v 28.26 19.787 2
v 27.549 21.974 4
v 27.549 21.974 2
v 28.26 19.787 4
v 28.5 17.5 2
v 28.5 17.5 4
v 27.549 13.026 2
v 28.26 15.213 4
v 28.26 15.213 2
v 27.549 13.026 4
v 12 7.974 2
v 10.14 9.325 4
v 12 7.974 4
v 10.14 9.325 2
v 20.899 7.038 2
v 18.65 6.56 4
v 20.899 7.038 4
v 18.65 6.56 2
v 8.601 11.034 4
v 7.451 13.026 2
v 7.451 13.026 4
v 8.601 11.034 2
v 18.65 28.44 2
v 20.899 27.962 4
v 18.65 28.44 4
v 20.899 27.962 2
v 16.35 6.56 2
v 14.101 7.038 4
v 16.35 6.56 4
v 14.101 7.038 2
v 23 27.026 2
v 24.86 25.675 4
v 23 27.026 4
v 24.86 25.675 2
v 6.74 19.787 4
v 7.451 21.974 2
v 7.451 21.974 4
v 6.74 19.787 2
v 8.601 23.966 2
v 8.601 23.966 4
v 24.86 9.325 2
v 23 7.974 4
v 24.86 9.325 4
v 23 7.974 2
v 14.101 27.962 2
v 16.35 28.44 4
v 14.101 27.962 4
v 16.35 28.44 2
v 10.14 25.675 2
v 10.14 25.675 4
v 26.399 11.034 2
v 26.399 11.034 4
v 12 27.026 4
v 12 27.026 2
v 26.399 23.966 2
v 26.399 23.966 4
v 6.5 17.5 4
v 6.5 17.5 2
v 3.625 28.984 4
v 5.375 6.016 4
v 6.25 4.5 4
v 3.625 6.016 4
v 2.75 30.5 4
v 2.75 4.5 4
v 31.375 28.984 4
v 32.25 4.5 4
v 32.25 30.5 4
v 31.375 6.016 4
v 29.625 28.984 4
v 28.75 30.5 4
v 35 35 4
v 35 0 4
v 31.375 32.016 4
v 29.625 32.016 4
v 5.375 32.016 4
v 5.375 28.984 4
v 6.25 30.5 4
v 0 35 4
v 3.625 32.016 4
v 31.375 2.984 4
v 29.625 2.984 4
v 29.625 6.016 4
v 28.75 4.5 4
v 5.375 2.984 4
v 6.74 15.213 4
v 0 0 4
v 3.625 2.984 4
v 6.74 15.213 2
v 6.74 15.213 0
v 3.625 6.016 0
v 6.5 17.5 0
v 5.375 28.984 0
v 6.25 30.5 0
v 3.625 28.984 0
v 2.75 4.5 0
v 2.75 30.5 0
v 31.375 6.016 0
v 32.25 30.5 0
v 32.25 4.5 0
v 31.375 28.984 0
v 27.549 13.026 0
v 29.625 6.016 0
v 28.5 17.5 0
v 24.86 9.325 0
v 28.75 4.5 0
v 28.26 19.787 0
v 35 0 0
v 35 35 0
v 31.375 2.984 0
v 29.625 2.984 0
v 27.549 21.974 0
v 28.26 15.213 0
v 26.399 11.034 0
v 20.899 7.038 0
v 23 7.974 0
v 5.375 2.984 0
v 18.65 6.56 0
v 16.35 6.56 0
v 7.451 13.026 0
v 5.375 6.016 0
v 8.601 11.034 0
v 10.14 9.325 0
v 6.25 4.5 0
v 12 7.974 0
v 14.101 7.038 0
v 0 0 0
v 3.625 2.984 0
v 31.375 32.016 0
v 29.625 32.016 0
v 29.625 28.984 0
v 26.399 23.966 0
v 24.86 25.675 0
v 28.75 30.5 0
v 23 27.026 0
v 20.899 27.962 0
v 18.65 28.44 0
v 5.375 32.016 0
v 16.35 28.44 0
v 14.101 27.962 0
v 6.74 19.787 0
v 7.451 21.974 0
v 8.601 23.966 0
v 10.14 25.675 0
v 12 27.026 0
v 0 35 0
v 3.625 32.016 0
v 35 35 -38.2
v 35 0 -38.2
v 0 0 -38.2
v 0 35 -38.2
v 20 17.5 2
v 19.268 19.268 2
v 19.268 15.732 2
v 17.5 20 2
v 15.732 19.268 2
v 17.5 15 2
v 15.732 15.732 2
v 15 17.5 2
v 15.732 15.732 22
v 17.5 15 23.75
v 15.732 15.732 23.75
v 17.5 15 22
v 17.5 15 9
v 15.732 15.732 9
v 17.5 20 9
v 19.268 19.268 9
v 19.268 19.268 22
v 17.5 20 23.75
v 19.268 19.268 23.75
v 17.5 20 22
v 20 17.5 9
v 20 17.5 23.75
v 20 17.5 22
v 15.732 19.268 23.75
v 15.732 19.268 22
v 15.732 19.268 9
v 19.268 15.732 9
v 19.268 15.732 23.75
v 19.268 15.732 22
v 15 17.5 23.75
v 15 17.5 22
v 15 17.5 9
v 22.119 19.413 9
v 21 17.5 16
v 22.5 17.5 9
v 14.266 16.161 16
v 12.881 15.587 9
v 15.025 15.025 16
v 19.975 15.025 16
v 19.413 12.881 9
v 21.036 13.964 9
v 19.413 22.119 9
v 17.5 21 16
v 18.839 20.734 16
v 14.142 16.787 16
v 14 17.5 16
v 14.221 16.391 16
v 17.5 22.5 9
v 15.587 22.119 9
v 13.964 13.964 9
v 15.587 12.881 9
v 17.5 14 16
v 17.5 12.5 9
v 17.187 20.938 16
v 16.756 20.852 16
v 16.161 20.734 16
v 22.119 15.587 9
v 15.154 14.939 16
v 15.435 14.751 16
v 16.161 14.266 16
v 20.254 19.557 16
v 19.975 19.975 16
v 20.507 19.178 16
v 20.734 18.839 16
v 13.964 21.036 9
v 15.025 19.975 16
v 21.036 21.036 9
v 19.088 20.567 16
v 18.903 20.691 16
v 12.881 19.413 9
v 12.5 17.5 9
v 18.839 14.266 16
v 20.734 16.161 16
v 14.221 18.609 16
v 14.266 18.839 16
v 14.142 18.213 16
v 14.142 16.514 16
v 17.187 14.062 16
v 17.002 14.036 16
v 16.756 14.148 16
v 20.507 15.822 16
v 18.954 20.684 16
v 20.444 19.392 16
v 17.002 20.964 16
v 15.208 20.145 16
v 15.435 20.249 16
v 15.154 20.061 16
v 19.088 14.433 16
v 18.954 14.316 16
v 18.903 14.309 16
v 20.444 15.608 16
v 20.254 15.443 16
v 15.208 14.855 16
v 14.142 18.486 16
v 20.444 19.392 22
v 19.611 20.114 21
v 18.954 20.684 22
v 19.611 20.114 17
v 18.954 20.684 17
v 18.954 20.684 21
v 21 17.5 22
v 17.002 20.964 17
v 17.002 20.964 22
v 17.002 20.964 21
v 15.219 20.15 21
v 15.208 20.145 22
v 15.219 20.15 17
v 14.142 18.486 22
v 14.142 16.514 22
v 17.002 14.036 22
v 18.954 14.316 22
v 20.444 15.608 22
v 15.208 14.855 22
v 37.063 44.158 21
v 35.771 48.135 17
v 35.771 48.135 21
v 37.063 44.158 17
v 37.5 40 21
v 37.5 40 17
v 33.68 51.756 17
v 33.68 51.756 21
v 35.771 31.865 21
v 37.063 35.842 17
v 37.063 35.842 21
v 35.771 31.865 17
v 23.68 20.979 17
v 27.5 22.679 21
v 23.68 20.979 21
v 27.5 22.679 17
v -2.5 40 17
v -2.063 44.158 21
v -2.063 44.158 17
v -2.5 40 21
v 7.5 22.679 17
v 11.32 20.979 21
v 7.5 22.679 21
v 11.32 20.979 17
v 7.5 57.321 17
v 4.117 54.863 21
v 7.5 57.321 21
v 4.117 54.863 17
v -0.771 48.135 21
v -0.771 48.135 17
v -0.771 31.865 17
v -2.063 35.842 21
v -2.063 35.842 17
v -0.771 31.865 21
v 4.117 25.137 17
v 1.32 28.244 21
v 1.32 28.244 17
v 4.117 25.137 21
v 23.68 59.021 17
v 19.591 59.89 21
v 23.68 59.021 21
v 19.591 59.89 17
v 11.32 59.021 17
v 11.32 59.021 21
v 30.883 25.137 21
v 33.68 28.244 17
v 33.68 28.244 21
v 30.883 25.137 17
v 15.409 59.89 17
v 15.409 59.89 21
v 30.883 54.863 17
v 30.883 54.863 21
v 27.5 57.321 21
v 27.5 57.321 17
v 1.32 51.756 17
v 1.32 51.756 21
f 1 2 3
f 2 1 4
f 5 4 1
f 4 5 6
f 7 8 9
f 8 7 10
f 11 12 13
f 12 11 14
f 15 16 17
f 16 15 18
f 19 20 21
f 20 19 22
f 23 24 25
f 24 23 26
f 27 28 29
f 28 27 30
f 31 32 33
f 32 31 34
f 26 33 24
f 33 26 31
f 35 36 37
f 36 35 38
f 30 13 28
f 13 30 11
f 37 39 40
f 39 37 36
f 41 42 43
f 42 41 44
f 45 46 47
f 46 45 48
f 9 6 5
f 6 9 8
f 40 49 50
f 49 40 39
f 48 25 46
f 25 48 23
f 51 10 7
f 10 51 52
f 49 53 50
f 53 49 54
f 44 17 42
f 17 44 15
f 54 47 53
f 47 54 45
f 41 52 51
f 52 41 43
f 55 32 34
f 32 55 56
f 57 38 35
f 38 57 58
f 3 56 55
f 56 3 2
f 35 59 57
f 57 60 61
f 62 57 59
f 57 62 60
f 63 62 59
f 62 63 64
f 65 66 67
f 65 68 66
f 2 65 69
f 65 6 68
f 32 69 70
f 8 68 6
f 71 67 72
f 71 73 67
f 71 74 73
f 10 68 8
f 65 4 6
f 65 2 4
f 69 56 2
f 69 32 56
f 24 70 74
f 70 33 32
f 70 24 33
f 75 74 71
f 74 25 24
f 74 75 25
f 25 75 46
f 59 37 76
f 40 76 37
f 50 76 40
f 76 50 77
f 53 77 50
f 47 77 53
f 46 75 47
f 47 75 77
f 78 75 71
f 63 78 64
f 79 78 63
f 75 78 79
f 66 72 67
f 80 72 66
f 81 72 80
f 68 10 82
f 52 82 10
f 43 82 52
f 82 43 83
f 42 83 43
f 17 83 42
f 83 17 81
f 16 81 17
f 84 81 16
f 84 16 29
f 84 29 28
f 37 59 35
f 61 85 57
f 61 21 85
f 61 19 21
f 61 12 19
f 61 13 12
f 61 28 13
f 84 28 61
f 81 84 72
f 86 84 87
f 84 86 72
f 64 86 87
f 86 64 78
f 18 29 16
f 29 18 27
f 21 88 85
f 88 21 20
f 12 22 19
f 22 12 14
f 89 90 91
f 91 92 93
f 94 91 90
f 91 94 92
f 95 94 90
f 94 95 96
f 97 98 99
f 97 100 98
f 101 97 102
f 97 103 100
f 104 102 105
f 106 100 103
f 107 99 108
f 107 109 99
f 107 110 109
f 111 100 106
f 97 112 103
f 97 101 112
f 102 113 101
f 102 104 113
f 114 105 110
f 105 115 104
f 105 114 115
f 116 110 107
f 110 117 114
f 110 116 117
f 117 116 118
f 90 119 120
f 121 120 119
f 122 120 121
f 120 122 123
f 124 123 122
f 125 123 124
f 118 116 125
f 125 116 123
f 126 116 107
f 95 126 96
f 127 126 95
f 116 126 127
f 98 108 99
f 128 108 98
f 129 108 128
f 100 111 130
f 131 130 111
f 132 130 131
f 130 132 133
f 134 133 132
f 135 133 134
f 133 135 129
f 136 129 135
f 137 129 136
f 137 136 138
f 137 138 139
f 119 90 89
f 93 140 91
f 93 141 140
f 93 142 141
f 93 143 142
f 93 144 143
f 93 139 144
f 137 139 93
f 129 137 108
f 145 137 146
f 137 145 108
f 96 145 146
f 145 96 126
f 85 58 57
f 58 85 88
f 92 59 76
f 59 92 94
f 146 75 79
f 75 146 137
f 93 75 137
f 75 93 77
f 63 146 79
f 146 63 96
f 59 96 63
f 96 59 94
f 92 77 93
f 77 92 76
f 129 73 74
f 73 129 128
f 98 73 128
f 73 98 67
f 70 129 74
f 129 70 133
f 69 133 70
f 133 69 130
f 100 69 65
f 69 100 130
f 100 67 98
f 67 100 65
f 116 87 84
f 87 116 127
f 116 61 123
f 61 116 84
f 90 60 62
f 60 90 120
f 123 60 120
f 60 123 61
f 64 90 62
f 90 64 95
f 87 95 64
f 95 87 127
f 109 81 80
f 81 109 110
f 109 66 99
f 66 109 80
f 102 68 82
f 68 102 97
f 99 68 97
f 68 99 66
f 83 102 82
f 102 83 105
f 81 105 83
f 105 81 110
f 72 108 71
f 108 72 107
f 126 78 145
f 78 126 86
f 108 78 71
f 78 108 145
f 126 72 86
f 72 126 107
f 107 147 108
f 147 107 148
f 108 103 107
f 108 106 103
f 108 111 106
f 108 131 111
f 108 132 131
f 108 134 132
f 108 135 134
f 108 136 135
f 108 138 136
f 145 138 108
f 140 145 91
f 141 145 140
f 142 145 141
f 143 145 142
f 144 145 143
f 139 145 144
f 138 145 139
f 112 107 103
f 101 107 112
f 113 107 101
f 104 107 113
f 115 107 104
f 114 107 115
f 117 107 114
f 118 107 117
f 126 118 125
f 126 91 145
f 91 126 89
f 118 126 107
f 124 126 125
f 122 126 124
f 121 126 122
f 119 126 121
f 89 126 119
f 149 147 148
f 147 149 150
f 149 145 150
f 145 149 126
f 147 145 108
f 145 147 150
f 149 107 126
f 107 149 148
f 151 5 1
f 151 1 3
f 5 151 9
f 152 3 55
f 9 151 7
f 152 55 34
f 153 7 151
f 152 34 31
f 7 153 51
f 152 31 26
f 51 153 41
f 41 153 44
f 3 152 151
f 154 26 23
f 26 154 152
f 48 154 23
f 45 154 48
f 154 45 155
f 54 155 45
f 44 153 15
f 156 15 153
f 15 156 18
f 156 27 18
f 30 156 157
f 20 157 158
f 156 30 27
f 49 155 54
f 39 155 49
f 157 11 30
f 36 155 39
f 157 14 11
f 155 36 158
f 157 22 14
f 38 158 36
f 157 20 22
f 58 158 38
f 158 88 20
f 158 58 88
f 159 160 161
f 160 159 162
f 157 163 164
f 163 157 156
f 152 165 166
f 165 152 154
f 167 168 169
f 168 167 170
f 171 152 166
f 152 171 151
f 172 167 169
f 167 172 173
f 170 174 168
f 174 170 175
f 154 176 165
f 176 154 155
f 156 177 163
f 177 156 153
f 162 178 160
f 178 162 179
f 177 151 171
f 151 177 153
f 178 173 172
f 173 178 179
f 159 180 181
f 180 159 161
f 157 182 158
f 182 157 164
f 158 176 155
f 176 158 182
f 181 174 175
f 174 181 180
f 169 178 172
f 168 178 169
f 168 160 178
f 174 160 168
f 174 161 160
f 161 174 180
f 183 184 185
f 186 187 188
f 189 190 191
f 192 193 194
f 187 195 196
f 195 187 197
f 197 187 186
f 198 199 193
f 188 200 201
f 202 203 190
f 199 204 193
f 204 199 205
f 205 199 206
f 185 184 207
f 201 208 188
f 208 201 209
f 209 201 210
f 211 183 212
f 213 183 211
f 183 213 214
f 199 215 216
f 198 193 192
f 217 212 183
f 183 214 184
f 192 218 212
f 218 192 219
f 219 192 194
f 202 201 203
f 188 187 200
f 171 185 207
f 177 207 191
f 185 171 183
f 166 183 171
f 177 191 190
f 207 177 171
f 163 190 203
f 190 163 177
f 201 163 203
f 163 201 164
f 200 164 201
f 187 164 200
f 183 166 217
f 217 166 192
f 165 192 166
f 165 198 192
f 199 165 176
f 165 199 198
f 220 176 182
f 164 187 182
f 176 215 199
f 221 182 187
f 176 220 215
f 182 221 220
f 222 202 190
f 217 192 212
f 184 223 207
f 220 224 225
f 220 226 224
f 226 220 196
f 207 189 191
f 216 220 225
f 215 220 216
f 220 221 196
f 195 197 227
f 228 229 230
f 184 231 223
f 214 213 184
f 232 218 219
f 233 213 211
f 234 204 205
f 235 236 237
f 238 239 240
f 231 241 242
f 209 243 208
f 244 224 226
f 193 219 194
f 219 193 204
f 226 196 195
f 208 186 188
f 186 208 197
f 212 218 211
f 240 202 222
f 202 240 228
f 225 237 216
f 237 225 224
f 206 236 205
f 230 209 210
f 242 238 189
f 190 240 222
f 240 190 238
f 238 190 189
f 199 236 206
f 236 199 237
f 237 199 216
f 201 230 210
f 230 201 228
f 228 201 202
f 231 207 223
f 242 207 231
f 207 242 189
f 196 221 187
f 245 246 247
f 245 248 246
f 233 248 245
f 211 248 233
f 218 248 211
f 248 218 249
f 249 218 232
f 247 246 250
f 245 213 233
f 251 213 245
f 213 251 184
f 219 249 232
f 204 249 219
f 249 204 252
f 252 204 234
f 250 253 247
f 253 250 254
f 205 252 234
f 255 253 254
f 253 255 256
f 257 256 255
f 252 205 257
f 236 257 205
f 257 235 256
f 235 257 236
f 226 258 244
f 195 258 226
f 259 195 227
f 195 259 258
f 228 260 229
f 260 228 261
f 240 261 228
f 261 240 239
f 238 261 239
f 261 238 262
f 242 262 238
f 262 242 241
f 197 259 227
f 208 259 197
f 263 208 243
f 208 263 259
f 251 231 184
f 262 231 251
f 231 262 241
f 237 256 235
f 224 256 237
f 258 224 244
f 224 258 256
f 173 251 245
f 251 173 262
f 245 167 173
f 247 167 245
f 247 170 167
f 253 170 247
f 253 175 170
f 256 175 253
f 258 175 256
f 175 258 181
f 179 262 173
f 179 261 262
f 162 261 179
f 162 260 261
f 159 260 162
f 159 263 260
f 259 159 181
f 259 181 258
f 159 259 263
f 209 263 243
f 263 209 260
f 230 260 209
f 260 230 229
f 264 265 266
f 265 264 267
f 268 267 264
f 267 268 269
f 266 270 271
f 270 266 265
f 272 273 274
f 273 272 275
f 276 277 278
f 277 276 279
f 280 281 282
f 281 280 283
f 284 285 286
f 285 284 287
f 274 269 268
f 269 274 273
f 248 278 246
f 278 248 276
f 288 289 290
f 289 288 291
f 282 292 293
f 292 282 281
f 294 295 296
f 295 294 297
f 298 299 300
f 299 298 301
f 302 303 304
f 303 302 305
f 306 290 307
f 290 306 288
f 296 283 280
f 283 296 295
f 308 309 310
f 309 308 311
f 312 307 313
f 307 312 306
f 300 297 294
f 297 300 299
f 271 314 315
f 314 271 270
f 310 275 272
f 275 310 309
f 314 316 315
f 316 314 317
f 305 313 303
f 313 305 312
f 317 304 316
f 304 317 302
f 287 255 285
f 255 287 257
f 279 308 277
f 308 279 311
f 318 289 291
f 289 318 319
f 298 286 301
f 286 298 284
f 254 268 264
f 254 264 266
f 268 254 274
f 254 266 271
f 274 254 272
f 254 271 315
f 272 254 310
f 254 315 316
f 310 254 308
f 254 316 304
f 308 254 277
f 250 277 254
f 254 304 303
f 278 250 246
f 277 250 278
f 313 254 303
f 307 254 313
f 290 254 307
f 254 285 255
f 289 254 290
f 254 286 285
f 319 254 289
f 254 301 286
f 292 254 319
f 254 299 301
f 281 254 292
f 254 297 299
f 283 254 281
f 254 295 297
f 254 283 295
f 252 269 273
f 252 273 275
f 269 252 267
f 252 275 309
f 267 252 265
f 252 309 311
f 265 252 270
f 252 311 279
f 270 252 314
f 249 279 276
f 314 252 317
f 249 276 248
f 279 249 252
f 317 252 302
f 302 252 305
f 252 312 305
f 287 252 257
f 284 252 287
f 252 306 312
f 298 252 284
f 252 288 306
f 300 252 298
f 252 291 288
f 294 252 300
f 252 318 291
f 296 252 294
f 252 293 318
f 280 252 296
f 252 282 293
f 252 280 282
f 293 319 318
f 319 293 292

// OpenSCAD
gear_module = 0.5;
motor_gear_teeth = 14;
motor_gear_mounting_part_length=7;
motor_gear_mounting_part_dia = 10;
motor_gear_gear_length=6;

driven_gear_teeth=80;
driven_gear_length=4;
driven_gear_hub_length=4;
driven_gear_hub_dia = 20;
// nema 14 motor

motor_mounting_hole_dia=3.5; // m3
motor_mounting_hole_distance = 26;
motor_size=35;
motor_depth = 38.2;
motor_shaft_length = 21.75;
motor_flange_dia = 22;
motor_flange_height = 2;
motor_shaft_dia = 5;


mount_thickness = 4;


module motor_mount_part(){
	difference(){
		cube(size=[motor_size,motor_size,mount_thickness]);
		translate([motor_size/2,motor_size/2,0]){
			cylinder(r=motor_flange_dia/2, h=mount_thickness);	
			// motor mounting holes
			translate(v=[-motor_mounting_hole_distance/2,motor_mounting_hole_distance/2,0])  cylinder(r=motor_mounting_hole_dia/2,h=mount_thickness);
			translate(v=[motor_mounting_hole_distance/2,motor_mounting_hole_distance/2,0])  cylinder(r=motor_mounting_hole_dia/2,h=mount_thickness);
			translate(v=[-motor_mounting_hole_distance/2,-motor_mounting_hole_distance/2,0])  cylinder(r=motor_mounting_hole_dia/2,h=mount_thickness);
			translate(v=[motor_mounting_hole_distance/2,-motor_mounting_hole_distance/2,0])  cylinder(r=motor_mounting_hole_dia/2,h=mount_thickness);
		} 
	}

}

module motor(){
	union(){
		cube(size=[motor_size, motor_size, motor_depth]);
		translate(v=[motor_size/2,motor_size/2,motor_depth]) cylinder(r=motor_flange_dia/2,h=motor_flange_height);

		translate(v=[motor_size/2,motor_size/2,motor_depth+motor_flange_height]) cylinder(r=motor_shaft_dia/2,h=motor_shaft_length);
	}
}



motor_mount_part();


// parts

// motor
#translate(v=[0,0,-motor_depth]) motor();

// motor gear
#translate(v=[motor_size/2,motor_size/2,motor_flange_height+7]){
	 cylinder(r1=motor_gear_mounting_part_dia/2,r2=(gear_module*motor_gear_teeth)/2, h=motor_gear_mounting_part_length) ;
	 translate(v=[0,0,motor_gear_mounting_part_length]) cylinder(r=(gear_module*motor_gear_teeth)/2, h=motor_gear_gear_length);
}
// driven gear
#translate(v=[motor_size/2,(gear_module*driven_gear_teeth),7]){
translate(v=[0,0,10]) cylinder(r=(gear_module*driven_gear_teeth)/2,h=driven_gear_hub_length);
}
